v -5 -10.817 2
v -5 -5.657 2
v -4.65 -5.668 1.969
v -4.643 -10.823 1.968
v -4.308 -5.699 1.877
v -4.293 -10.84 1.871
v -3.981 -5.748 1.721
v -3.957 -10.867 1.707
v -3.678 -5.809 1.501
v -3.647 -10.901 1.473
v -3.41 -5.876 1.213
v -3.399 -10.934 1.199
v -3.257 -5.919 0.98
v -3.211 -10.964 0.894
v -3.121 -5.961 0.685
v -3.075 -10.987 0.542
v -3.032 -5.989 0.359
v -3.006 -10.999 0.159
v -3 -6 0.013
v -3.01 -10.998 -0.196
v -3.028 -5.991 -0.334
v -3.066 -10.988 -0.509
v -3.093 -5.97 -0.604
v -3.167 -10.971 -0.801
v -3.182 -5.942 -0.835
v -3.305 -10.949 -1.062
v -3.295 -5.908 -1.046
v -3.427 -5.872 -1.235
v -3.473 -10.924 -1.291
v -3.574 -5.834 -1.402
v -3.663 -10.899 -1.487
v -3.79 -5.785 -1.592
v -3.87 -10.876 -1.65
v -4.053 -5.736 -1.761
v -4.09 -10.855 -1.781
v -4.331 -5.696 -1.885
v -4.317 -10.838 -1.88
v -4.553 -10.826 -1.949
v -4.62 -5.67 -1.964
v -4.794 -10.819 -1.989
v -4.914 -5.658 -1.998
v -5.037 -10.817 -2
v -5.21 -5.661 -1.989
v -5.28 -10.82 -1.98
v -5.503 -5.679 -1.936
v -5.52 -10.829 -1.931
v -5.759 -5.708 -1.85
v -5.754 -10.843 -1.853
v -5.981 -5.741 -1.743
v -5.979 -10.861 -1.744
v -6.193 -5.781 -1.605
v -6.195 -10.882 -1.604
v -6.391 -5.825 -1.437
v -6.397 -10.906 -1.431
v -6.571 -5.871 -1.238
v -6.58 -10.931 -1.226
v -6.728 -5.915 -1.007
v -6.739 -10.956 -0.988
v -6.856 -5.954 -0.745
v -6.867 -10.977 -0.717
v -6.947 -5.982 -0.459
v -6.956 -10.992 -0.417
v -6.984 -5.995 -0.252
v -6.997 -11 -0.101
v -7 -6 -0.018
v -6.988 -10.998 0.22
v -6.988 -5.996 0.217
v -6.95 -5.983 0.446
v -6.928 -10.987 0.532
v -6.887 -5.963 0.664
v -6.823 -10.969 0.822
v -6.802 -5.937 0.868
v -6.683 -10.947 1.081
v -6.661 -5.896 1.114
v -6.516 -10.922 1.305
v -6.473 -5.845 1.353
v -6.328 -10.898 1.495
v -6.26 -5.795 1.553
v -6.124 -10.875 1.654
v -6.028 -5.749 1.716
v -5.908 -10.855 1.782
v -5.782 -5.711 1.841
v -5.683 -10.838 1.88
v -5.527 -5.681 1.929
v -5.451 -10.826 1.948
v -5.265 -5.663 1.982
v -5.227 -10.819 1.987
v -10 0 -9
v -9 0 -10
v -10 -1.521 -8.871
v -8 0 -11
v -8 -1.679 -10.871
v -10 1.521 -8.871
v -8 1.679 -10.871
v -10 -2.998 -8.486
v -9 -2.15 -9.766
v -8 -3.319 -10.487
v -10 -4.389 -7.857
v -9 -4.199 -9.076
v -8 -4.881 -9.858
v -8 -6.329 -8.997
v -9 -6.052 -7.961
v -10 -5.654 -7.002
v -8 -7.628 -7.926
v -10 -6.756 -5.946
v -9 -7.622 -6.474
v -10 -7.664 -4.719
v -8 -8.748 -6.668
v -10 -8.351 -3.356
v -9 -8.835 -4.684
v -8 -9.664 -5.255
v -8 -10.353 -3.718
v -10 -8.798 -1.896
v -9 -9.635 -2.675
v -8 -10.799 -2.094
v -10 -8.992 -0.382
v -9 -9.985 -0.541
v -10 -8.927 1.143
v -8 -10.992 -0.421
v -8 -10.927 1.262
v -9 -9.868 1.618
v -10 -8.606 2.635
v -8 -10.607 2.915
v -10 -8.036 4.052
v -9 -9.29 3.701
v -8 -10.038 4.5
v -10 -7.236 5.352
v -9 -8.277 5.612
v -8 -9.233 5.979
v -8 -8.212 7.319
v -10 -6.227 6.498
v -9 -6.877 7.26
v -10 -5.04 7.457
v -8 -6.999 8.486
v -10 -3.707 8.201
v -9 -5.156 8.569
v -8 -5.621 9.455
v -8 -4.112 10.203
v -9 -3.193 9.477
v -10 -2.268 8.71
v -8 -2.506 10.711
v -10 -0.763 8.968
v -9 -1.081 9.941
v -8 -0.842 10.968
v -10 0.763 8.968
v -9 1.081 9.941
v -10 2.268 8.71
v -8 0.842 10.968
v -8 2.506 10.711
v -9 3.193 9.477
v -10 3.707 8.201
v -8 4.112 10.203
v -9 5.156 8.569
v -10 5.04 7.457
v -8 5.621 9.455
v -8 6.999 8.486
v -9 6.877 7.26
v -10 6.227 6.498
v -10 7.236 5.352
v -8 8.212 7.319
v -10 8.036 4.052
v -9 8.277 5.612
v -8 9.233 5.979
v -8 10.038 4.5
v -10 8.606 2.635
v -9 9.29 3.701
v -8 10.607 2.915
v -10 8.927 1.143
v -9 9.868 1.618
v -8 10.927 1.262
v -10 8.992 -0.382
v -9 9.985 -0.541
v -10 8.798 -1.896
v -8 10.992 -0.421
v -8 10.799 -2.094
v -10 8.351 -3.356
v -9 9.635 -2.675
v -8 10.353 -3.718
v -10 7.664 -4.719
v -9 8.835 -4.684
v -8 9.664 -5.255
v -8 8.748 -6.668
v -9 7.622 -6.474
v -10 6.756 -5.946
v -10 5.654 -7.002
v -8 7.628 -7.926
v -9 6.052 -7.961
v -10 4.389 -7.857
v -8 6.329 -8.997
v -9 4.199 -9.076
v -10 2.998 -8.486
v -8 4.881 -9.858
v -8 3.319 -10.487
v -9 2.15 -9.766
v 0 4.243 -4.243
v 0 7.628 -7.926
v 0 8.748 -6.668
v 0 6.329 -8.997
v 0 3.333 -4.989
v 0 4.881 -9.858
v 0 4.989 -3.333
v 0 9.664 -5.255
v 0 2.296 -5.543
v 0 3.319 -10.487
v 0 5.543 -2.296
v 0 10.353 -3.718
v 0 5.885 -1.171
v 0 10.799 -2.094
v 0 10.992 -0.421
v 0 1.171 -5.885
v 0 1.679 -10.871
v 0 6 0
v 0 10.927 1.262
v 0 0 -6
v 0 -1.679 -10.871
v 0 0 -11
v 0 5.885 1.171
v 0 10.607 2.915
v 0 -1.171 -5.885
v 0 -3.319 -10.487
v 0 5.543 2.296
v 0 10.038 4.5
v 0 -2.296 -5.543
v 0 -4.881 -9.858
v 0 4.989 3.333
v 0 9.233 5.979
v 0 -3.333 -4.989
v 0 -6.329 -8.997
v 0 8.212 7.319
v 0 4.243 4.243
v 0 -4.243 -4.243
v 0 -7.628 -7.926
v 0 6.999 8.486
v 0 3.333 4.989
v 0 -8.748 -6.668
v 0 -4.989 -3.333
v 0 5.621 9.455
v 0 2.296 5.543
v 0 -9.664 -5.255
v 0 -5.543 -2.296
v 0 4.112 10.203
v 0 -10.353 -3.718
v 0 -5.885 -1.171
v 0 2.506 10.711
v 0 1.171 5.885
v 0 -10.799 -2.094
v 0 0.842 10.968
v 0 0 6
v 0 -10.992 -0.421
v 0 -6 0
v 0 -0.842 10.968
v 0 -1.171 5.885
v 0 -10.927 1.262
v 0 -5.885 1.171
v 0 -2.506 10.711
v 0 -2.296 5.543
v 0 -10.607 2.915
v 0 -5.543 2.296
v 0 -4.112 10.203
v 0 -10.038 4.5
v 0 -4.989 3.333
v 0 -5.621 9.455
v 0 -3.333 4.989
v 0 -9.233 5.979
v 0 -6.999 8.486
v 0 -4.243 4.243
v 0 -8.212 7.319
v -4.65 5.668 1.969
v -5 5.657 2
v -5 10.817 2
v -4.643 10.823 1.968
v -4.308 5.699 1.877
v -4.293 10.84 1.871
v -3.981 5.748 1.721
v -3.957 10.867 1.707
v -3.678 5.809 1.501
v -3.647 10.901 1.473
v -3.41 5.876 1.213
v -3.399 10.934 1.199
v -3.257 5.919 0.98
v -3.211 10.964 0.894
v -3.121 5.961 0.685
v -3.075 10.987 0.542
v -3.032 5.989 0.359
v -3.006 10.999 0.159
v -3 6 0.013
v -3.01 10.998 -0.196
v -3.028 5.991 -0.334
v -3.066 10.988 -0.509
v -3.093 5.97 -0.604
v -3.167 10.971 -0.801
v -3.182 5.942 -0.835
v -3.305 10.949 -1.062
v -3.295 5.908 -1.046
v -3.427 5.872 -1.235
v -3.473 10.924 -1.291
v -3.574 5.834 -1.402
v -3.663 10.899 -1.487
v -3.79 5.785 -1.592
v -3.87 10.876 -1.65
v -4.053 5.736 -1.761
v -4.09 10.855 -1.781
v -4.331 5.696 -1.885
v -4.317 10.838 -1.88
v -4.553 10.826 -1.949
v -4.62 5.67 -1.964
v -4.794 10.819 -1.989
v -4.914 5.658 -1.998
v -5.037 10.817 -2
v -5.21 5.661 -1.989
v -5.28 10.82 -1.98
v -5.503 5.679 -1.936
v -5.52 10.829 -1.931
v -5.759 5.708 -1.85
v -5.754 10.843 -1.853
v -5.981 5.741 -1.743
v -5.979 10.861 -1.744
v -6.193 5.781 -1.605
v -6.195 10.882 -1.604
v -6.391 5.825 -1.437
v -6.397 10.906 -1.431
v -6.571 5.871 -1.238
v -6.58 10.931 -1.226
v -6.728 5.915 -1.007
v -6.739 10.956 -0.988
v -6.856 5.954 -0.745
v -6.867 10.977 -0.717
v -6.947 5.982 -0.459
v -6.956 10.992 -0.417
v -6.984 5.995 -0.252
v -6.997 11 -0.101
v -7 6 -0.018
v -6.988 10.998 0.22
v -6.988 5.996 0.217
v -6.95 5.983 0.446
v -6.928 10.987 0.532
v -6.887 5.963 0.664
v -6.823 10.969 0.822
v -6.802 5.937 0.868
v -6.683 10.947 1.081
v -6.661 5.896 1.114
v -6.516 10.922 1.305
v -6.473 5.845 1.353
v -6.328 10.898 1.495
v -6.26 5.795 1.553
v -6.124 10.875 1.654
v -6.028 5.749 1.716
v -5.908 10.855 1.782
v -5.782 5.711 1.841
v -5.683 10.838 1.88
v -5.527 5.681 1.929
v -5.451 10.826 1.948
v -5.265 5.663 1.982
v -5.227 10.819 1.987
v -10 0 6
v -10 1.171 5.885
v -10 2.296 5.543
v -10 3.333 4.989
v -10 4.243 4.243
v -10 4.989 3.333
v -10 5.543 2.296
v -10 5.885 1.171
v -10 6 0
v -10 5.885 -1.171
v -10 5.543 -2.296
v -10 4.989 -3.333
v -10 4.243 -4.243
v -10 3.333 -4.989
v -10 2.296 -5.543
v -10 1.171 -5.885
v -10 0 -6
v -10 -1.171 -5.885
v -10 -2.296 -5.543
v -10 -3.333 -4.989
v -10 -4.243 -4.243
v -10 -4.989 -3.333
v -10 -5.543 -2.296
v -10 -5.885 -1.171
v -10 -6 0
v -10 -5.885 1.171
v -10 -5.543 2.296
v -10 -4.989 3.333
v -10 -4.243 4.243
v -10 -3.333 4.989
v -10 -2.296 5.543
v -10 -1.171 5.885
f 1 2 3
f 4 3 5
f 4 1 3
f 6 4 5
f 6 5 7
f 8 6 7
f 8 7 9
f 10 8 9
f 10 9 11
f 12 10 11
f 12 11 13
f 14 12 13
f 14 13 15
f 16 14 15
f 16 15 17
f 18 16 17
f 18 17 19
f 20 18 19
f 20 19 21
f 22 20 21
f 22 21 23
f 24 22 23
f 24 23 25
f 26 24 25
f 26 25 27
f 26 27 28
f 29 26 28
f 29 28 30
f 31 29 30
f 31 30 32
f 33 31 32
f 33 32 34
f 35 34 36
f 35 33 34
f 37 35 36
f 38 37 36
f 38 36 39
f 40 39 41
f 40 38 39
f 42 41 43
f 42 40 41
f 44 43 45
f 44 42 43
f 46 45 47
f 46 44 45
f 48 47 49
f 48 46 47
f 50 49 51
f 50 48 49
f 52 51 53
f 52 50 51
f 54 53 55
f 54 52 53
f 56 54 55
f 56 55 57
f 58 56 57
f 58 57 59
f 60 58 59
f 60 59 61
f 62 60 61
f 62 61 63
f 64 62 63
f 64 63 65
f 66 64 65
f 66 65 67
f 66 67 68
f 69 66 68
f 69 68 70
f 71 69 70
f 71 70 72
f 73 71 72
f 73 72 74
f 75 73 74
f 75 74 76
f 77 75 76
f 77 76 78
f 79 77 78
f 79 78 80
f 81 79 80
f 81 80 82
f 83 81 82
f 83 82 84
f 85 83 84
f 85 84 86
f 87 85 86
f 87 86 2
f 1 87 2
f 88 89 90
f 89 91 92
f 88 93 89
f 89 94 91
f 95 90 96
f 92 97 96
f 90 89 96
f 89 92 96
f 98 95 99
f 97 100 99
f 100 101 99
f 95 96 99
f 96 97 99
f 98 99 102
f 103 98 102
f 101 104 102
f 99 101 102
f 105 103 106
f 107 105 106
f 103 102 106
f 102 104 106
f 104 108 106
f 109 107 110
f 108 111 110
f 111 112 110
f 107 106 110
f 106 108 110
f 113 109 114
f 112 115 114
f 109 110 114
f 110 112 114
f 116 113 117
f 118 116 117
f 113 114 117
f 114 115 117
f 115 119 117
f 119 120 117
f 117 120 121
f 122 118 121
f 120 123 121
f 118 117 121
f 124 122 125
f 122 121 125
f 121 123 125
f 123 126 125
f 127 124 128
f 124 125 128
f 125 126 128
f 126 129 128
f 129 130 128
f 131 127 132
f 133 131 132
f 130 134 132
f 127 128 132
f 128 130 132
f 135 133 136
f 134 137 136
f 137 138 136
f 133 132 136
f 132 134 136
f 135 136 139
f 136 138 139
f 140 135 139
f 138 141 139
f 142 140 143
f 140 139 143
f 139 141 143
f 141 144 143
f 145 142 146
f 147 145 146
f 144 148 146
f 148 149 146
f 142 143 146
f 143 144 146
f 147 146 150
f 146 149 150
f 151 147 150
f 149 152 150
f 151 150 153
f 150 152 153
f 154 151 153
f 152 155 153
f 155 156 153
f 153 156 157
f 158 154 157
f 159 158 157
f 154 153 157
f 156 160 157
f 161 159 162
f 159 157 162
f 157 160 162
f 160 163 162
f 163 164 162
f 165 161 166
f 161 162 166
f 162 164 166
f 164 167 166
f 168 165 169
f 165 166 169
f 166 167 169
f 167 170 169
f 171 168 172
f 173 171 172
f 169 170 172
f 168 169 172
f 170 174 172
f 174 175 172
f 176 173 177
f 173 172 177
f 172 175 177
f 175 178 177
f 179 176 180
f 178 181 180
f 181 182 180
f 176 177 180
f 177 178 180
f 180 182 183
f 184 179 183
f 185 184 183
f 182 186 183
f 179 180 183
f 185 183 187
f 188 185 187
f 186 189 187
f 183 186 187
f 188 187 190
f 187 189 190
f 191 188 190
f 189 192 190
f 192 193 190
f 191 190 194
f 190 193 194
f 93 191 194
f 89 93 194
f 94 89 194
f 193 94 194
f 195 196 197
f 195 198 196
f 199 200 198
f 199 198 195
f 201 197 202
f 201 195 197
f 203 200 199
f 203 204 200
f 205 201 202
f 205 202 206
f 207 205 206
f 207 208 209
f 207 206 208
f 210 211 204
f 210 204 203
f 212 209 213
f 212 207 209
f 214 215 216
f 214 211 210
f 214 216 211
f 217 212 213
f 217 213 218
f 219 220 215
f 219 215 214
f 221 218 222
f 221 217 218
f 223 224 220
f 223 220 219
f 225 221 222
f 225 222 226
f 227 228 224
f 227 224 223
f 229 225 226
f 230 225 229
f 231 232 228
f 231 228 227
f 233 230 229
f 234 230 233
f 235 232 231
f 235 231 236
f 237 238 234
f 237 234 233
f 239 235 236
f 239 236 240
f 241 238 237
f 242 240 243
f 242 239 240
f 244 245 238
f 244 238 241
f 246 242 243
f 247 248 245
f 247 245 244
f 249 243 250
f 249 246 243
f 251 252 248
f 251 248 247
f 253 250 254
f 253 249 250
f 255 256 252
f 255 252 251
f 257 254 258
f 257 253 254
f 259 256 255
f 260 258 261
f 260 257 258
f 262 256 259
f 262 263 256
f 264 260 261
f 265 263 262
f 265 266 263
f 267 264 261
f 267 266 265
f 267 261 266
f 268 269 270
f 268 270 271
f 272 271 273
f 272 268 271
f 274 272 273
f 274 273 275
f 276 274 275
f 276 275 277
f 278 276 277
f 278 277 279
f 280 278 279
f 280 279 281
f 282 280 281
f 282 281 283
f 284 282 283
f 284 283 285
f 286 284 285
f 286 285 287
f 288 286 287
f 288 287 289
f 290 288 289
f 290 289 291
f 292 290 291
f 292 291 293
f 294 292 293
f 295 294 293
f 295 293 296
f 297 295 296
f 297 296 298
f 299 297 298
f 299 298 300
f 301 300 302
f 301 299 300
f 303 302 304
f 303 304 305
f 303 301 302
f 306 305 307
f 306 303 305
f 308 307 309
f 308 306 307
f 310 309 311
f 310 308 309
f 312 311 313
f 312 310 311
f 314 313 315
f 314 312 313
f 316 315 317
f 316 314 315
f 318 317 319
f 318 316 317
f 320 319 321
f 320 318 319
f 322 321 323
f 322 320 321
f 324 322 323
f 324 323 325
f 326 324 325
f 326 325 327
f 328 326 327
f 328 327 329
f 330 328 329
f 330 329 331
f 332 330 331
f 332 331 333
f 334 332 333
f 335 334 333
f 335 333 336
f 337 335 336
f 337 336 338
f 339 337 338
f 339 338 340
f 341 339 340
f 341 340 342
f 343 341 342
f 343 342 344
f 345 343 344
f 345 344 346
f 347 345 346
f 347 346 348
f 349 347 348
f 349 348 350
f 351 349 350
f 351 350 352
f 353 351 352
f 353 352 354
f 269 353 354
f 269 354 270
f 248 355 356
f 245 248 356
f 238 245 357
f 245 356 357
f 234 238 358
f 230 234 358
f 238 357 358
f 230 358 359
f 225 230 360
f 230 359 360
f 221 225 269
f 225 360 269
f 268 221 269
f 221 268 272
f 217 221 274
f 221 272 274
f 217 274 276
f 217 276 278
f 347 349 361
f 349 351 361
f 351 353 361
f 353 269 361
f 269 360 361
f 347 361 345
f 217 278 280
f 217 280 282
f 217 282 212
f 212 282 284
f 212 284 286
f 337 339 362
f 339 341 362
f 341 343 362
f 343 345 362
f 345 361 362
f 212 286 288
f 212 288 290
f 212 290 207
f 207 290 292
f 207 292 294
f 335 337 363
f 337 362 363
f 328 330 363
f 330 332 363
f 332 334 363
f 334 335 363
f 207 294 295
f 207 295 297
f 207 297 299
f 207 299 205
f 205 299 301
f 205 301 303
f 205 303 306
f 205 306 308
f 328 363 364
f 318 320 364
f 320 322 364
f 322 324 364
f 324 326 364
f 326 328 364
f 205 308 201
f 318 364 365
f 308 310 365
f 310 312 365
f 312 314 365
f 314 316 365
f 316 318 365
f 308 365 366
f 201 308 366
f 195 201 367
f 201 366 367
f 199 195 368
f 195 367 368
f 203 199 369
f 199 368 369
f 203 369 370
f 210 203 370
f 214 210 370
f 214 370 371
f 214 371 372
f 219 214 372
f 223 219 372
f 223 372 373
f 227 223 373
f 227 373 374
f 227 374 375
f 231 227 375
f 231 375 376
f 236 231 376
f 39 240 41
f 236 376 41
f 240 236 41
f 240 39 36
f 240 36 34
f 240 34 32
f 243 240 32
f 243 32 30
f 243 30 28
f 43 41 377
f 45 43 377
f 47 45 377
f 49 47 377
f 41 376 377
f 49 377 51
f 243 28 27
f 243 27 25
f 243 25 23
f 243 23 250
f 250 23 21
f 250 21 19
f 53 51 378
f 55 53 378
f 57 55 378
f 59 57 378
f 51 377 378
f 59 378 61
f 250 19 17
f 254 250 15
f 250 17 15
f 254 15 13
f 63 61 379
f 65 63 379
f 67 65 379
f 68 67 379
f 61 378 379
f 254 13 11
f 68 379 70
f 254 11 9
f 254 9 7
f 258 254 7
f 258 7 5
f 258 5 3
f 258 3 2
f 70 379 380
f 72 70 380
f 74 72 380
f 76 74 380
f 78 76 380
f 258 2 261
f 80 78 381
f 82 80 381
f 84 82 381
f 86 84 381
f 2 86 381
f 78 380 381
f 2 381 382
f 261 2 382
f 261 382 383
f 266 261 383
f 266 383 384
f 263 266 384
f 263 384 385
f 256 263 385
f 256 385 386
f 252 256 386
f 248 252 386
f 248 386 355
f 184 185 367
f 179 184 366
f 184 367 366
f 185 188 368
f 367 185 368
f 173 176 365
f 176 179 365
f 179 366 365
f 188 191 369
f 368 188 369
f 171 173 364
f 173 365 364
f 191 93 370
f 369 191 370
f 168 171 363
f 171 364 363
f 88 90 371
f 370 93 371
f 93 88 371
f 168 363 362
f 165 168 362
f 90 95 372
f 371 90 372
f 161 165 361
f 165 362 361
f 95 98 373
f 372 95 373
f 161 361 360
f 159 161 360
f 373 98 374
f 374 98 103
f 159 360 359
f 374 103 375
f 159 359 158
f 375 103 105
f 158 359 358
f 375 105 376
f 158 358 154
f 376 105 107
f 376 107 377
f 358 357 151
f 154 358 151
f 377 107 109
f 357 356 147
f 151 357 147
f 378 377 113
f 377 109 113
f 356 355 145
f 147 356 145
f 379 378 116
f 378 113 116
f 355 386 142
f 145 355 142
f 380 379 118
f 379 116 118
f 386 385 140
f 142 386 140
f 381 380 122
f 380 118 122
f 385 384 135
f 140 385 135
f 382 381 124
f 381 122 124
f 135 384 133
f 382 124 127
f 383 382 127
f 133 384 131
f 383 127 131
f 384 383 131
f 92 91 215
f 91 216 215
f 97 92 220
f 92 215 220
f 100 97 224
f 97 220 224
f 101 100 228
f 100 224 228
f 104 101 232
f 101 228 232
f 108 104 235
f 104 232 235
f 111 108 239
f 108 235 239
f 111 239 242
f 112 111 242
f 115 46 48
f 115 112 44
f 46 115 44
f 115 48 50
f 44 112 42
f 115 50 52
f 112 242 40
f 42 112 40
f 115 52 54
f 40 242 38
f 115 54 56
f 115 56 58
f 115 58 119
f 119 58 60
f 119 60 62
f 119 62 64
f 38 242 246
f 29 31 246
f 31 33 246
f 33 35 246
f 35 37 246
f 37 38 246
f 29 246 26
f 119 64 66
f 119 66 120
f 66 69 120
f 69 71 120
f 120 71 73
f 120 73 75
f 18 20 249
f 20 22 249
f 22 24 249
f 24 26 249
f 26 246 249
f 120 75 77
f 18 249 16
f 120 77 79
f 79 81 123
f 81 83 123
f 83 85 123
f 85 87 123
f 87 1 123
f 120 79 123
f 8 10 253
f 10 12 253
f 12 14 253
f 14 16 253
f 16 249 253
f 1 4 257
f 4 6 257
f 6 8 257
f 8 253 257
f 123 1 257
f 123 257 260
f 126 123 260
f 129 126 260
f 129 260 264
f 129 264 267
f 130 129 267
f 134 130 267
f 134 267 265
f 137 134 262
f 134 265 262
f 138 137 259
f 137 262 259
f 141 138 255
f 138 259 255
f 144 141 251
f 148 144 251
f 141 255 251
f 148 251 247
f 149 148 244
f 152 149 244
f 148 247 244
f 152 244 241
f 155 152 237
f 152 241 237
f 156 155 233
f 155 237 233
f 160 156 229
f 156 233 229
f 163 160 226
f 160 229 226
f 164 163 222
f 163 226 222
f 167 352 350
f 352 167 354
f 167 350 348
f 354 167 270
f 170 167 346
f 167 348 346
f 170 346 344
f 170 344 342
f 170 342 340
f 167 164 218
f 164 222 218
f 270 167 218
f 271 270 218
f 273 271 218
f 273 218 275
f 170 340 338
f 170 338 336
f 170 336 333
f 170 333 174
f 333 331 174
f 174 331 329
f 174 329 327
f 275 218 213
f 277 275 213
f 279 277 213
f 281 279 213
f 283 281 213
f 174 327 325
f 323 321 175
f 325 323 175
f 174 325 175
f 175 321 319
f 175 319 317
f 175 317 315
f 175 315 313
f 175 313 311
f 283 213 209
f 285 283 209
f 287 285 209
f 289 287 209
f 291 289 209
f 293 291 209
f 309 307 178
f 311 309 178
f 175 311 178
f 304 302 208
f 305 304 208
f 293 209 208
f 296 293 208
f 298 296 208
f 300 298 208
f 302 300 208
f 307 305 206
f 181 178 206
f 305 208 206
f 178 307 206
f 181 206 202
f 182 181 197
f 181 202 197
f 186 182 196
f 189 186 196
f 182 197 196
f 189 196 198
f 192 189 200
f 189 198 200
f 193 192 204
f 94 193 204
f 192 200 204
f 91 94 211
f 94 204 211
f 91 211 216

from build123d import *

# Parameters (mm, degrees)
SKETCH_1_W               = 10
SKETCH_1_H               = 11
CHAMFER_1_SIZE           = 2
SKETCH_2_R               = 6
CUT_EXTRUDE_1_DEPTH      = 19.493242009
CUT_EXTRUDE_2_DEPTH      = 19.493242009
CUT_EXTRUDE_2_DEPTH_BACK = 19.493242009
SKETCH_3_R               = 2


with BuildPart() as part:
    # 草图1 → 旋转1 (revolve)
    with BuildSketch(Plane.XY, mode=Mode.PRIVATE) as revolve_1_sk:
        with Locations((-5, 5.5)):
            Rectangle(SKETCH_1_W, SKETCH_1_H)
    revolve(revolve_1_sk.sketch.rotate(Axis((0, 0, 0), (-1, 0, 0)), 90), axis=Axis((0, 0, 0), (-1, 0, 0)))

    # 倒角1
    chamfer_1_edges = [part.edges().sort_by_distance(p)[0] for p in [
        (-10, 0, 11),
    ]]
    chamfer(chamfer_1_edges, length=CHAMFER_1_SIZE)

    # 草图2 → 切除-拉伸1 (cut, through all)
    with BuildSketch(Plane.ZY.offset(10)):
        Circle(SKETCH_2_R)
    extrude(amount=-CUT_EXTRUDE_1_DEPTH, mode=Mode.SUBTRACT)

    # 草图3 → 切除-拉伸2 (cut, two sides: drawn at the far end of the back side and taken through both)
    with BuildSketch(Plane(origin=(0, 0, 0), x_dir=(1, 0, 0), z_dir=(0, 1, 0)).offset(-CUT_EXTRUDE_2_DEPTH_BACK)):
        with Locations(Location((-5, 0, 0), (0, 0, 270))):
            Circle(SKETCH_3_R)
    extrude(amount=CUT_EXTRUDE_2_DEPTH + CUT_EXTRUDE_2_DEPTH_BACK, mode=Mode.SUBTRACT)


solid = part.part
